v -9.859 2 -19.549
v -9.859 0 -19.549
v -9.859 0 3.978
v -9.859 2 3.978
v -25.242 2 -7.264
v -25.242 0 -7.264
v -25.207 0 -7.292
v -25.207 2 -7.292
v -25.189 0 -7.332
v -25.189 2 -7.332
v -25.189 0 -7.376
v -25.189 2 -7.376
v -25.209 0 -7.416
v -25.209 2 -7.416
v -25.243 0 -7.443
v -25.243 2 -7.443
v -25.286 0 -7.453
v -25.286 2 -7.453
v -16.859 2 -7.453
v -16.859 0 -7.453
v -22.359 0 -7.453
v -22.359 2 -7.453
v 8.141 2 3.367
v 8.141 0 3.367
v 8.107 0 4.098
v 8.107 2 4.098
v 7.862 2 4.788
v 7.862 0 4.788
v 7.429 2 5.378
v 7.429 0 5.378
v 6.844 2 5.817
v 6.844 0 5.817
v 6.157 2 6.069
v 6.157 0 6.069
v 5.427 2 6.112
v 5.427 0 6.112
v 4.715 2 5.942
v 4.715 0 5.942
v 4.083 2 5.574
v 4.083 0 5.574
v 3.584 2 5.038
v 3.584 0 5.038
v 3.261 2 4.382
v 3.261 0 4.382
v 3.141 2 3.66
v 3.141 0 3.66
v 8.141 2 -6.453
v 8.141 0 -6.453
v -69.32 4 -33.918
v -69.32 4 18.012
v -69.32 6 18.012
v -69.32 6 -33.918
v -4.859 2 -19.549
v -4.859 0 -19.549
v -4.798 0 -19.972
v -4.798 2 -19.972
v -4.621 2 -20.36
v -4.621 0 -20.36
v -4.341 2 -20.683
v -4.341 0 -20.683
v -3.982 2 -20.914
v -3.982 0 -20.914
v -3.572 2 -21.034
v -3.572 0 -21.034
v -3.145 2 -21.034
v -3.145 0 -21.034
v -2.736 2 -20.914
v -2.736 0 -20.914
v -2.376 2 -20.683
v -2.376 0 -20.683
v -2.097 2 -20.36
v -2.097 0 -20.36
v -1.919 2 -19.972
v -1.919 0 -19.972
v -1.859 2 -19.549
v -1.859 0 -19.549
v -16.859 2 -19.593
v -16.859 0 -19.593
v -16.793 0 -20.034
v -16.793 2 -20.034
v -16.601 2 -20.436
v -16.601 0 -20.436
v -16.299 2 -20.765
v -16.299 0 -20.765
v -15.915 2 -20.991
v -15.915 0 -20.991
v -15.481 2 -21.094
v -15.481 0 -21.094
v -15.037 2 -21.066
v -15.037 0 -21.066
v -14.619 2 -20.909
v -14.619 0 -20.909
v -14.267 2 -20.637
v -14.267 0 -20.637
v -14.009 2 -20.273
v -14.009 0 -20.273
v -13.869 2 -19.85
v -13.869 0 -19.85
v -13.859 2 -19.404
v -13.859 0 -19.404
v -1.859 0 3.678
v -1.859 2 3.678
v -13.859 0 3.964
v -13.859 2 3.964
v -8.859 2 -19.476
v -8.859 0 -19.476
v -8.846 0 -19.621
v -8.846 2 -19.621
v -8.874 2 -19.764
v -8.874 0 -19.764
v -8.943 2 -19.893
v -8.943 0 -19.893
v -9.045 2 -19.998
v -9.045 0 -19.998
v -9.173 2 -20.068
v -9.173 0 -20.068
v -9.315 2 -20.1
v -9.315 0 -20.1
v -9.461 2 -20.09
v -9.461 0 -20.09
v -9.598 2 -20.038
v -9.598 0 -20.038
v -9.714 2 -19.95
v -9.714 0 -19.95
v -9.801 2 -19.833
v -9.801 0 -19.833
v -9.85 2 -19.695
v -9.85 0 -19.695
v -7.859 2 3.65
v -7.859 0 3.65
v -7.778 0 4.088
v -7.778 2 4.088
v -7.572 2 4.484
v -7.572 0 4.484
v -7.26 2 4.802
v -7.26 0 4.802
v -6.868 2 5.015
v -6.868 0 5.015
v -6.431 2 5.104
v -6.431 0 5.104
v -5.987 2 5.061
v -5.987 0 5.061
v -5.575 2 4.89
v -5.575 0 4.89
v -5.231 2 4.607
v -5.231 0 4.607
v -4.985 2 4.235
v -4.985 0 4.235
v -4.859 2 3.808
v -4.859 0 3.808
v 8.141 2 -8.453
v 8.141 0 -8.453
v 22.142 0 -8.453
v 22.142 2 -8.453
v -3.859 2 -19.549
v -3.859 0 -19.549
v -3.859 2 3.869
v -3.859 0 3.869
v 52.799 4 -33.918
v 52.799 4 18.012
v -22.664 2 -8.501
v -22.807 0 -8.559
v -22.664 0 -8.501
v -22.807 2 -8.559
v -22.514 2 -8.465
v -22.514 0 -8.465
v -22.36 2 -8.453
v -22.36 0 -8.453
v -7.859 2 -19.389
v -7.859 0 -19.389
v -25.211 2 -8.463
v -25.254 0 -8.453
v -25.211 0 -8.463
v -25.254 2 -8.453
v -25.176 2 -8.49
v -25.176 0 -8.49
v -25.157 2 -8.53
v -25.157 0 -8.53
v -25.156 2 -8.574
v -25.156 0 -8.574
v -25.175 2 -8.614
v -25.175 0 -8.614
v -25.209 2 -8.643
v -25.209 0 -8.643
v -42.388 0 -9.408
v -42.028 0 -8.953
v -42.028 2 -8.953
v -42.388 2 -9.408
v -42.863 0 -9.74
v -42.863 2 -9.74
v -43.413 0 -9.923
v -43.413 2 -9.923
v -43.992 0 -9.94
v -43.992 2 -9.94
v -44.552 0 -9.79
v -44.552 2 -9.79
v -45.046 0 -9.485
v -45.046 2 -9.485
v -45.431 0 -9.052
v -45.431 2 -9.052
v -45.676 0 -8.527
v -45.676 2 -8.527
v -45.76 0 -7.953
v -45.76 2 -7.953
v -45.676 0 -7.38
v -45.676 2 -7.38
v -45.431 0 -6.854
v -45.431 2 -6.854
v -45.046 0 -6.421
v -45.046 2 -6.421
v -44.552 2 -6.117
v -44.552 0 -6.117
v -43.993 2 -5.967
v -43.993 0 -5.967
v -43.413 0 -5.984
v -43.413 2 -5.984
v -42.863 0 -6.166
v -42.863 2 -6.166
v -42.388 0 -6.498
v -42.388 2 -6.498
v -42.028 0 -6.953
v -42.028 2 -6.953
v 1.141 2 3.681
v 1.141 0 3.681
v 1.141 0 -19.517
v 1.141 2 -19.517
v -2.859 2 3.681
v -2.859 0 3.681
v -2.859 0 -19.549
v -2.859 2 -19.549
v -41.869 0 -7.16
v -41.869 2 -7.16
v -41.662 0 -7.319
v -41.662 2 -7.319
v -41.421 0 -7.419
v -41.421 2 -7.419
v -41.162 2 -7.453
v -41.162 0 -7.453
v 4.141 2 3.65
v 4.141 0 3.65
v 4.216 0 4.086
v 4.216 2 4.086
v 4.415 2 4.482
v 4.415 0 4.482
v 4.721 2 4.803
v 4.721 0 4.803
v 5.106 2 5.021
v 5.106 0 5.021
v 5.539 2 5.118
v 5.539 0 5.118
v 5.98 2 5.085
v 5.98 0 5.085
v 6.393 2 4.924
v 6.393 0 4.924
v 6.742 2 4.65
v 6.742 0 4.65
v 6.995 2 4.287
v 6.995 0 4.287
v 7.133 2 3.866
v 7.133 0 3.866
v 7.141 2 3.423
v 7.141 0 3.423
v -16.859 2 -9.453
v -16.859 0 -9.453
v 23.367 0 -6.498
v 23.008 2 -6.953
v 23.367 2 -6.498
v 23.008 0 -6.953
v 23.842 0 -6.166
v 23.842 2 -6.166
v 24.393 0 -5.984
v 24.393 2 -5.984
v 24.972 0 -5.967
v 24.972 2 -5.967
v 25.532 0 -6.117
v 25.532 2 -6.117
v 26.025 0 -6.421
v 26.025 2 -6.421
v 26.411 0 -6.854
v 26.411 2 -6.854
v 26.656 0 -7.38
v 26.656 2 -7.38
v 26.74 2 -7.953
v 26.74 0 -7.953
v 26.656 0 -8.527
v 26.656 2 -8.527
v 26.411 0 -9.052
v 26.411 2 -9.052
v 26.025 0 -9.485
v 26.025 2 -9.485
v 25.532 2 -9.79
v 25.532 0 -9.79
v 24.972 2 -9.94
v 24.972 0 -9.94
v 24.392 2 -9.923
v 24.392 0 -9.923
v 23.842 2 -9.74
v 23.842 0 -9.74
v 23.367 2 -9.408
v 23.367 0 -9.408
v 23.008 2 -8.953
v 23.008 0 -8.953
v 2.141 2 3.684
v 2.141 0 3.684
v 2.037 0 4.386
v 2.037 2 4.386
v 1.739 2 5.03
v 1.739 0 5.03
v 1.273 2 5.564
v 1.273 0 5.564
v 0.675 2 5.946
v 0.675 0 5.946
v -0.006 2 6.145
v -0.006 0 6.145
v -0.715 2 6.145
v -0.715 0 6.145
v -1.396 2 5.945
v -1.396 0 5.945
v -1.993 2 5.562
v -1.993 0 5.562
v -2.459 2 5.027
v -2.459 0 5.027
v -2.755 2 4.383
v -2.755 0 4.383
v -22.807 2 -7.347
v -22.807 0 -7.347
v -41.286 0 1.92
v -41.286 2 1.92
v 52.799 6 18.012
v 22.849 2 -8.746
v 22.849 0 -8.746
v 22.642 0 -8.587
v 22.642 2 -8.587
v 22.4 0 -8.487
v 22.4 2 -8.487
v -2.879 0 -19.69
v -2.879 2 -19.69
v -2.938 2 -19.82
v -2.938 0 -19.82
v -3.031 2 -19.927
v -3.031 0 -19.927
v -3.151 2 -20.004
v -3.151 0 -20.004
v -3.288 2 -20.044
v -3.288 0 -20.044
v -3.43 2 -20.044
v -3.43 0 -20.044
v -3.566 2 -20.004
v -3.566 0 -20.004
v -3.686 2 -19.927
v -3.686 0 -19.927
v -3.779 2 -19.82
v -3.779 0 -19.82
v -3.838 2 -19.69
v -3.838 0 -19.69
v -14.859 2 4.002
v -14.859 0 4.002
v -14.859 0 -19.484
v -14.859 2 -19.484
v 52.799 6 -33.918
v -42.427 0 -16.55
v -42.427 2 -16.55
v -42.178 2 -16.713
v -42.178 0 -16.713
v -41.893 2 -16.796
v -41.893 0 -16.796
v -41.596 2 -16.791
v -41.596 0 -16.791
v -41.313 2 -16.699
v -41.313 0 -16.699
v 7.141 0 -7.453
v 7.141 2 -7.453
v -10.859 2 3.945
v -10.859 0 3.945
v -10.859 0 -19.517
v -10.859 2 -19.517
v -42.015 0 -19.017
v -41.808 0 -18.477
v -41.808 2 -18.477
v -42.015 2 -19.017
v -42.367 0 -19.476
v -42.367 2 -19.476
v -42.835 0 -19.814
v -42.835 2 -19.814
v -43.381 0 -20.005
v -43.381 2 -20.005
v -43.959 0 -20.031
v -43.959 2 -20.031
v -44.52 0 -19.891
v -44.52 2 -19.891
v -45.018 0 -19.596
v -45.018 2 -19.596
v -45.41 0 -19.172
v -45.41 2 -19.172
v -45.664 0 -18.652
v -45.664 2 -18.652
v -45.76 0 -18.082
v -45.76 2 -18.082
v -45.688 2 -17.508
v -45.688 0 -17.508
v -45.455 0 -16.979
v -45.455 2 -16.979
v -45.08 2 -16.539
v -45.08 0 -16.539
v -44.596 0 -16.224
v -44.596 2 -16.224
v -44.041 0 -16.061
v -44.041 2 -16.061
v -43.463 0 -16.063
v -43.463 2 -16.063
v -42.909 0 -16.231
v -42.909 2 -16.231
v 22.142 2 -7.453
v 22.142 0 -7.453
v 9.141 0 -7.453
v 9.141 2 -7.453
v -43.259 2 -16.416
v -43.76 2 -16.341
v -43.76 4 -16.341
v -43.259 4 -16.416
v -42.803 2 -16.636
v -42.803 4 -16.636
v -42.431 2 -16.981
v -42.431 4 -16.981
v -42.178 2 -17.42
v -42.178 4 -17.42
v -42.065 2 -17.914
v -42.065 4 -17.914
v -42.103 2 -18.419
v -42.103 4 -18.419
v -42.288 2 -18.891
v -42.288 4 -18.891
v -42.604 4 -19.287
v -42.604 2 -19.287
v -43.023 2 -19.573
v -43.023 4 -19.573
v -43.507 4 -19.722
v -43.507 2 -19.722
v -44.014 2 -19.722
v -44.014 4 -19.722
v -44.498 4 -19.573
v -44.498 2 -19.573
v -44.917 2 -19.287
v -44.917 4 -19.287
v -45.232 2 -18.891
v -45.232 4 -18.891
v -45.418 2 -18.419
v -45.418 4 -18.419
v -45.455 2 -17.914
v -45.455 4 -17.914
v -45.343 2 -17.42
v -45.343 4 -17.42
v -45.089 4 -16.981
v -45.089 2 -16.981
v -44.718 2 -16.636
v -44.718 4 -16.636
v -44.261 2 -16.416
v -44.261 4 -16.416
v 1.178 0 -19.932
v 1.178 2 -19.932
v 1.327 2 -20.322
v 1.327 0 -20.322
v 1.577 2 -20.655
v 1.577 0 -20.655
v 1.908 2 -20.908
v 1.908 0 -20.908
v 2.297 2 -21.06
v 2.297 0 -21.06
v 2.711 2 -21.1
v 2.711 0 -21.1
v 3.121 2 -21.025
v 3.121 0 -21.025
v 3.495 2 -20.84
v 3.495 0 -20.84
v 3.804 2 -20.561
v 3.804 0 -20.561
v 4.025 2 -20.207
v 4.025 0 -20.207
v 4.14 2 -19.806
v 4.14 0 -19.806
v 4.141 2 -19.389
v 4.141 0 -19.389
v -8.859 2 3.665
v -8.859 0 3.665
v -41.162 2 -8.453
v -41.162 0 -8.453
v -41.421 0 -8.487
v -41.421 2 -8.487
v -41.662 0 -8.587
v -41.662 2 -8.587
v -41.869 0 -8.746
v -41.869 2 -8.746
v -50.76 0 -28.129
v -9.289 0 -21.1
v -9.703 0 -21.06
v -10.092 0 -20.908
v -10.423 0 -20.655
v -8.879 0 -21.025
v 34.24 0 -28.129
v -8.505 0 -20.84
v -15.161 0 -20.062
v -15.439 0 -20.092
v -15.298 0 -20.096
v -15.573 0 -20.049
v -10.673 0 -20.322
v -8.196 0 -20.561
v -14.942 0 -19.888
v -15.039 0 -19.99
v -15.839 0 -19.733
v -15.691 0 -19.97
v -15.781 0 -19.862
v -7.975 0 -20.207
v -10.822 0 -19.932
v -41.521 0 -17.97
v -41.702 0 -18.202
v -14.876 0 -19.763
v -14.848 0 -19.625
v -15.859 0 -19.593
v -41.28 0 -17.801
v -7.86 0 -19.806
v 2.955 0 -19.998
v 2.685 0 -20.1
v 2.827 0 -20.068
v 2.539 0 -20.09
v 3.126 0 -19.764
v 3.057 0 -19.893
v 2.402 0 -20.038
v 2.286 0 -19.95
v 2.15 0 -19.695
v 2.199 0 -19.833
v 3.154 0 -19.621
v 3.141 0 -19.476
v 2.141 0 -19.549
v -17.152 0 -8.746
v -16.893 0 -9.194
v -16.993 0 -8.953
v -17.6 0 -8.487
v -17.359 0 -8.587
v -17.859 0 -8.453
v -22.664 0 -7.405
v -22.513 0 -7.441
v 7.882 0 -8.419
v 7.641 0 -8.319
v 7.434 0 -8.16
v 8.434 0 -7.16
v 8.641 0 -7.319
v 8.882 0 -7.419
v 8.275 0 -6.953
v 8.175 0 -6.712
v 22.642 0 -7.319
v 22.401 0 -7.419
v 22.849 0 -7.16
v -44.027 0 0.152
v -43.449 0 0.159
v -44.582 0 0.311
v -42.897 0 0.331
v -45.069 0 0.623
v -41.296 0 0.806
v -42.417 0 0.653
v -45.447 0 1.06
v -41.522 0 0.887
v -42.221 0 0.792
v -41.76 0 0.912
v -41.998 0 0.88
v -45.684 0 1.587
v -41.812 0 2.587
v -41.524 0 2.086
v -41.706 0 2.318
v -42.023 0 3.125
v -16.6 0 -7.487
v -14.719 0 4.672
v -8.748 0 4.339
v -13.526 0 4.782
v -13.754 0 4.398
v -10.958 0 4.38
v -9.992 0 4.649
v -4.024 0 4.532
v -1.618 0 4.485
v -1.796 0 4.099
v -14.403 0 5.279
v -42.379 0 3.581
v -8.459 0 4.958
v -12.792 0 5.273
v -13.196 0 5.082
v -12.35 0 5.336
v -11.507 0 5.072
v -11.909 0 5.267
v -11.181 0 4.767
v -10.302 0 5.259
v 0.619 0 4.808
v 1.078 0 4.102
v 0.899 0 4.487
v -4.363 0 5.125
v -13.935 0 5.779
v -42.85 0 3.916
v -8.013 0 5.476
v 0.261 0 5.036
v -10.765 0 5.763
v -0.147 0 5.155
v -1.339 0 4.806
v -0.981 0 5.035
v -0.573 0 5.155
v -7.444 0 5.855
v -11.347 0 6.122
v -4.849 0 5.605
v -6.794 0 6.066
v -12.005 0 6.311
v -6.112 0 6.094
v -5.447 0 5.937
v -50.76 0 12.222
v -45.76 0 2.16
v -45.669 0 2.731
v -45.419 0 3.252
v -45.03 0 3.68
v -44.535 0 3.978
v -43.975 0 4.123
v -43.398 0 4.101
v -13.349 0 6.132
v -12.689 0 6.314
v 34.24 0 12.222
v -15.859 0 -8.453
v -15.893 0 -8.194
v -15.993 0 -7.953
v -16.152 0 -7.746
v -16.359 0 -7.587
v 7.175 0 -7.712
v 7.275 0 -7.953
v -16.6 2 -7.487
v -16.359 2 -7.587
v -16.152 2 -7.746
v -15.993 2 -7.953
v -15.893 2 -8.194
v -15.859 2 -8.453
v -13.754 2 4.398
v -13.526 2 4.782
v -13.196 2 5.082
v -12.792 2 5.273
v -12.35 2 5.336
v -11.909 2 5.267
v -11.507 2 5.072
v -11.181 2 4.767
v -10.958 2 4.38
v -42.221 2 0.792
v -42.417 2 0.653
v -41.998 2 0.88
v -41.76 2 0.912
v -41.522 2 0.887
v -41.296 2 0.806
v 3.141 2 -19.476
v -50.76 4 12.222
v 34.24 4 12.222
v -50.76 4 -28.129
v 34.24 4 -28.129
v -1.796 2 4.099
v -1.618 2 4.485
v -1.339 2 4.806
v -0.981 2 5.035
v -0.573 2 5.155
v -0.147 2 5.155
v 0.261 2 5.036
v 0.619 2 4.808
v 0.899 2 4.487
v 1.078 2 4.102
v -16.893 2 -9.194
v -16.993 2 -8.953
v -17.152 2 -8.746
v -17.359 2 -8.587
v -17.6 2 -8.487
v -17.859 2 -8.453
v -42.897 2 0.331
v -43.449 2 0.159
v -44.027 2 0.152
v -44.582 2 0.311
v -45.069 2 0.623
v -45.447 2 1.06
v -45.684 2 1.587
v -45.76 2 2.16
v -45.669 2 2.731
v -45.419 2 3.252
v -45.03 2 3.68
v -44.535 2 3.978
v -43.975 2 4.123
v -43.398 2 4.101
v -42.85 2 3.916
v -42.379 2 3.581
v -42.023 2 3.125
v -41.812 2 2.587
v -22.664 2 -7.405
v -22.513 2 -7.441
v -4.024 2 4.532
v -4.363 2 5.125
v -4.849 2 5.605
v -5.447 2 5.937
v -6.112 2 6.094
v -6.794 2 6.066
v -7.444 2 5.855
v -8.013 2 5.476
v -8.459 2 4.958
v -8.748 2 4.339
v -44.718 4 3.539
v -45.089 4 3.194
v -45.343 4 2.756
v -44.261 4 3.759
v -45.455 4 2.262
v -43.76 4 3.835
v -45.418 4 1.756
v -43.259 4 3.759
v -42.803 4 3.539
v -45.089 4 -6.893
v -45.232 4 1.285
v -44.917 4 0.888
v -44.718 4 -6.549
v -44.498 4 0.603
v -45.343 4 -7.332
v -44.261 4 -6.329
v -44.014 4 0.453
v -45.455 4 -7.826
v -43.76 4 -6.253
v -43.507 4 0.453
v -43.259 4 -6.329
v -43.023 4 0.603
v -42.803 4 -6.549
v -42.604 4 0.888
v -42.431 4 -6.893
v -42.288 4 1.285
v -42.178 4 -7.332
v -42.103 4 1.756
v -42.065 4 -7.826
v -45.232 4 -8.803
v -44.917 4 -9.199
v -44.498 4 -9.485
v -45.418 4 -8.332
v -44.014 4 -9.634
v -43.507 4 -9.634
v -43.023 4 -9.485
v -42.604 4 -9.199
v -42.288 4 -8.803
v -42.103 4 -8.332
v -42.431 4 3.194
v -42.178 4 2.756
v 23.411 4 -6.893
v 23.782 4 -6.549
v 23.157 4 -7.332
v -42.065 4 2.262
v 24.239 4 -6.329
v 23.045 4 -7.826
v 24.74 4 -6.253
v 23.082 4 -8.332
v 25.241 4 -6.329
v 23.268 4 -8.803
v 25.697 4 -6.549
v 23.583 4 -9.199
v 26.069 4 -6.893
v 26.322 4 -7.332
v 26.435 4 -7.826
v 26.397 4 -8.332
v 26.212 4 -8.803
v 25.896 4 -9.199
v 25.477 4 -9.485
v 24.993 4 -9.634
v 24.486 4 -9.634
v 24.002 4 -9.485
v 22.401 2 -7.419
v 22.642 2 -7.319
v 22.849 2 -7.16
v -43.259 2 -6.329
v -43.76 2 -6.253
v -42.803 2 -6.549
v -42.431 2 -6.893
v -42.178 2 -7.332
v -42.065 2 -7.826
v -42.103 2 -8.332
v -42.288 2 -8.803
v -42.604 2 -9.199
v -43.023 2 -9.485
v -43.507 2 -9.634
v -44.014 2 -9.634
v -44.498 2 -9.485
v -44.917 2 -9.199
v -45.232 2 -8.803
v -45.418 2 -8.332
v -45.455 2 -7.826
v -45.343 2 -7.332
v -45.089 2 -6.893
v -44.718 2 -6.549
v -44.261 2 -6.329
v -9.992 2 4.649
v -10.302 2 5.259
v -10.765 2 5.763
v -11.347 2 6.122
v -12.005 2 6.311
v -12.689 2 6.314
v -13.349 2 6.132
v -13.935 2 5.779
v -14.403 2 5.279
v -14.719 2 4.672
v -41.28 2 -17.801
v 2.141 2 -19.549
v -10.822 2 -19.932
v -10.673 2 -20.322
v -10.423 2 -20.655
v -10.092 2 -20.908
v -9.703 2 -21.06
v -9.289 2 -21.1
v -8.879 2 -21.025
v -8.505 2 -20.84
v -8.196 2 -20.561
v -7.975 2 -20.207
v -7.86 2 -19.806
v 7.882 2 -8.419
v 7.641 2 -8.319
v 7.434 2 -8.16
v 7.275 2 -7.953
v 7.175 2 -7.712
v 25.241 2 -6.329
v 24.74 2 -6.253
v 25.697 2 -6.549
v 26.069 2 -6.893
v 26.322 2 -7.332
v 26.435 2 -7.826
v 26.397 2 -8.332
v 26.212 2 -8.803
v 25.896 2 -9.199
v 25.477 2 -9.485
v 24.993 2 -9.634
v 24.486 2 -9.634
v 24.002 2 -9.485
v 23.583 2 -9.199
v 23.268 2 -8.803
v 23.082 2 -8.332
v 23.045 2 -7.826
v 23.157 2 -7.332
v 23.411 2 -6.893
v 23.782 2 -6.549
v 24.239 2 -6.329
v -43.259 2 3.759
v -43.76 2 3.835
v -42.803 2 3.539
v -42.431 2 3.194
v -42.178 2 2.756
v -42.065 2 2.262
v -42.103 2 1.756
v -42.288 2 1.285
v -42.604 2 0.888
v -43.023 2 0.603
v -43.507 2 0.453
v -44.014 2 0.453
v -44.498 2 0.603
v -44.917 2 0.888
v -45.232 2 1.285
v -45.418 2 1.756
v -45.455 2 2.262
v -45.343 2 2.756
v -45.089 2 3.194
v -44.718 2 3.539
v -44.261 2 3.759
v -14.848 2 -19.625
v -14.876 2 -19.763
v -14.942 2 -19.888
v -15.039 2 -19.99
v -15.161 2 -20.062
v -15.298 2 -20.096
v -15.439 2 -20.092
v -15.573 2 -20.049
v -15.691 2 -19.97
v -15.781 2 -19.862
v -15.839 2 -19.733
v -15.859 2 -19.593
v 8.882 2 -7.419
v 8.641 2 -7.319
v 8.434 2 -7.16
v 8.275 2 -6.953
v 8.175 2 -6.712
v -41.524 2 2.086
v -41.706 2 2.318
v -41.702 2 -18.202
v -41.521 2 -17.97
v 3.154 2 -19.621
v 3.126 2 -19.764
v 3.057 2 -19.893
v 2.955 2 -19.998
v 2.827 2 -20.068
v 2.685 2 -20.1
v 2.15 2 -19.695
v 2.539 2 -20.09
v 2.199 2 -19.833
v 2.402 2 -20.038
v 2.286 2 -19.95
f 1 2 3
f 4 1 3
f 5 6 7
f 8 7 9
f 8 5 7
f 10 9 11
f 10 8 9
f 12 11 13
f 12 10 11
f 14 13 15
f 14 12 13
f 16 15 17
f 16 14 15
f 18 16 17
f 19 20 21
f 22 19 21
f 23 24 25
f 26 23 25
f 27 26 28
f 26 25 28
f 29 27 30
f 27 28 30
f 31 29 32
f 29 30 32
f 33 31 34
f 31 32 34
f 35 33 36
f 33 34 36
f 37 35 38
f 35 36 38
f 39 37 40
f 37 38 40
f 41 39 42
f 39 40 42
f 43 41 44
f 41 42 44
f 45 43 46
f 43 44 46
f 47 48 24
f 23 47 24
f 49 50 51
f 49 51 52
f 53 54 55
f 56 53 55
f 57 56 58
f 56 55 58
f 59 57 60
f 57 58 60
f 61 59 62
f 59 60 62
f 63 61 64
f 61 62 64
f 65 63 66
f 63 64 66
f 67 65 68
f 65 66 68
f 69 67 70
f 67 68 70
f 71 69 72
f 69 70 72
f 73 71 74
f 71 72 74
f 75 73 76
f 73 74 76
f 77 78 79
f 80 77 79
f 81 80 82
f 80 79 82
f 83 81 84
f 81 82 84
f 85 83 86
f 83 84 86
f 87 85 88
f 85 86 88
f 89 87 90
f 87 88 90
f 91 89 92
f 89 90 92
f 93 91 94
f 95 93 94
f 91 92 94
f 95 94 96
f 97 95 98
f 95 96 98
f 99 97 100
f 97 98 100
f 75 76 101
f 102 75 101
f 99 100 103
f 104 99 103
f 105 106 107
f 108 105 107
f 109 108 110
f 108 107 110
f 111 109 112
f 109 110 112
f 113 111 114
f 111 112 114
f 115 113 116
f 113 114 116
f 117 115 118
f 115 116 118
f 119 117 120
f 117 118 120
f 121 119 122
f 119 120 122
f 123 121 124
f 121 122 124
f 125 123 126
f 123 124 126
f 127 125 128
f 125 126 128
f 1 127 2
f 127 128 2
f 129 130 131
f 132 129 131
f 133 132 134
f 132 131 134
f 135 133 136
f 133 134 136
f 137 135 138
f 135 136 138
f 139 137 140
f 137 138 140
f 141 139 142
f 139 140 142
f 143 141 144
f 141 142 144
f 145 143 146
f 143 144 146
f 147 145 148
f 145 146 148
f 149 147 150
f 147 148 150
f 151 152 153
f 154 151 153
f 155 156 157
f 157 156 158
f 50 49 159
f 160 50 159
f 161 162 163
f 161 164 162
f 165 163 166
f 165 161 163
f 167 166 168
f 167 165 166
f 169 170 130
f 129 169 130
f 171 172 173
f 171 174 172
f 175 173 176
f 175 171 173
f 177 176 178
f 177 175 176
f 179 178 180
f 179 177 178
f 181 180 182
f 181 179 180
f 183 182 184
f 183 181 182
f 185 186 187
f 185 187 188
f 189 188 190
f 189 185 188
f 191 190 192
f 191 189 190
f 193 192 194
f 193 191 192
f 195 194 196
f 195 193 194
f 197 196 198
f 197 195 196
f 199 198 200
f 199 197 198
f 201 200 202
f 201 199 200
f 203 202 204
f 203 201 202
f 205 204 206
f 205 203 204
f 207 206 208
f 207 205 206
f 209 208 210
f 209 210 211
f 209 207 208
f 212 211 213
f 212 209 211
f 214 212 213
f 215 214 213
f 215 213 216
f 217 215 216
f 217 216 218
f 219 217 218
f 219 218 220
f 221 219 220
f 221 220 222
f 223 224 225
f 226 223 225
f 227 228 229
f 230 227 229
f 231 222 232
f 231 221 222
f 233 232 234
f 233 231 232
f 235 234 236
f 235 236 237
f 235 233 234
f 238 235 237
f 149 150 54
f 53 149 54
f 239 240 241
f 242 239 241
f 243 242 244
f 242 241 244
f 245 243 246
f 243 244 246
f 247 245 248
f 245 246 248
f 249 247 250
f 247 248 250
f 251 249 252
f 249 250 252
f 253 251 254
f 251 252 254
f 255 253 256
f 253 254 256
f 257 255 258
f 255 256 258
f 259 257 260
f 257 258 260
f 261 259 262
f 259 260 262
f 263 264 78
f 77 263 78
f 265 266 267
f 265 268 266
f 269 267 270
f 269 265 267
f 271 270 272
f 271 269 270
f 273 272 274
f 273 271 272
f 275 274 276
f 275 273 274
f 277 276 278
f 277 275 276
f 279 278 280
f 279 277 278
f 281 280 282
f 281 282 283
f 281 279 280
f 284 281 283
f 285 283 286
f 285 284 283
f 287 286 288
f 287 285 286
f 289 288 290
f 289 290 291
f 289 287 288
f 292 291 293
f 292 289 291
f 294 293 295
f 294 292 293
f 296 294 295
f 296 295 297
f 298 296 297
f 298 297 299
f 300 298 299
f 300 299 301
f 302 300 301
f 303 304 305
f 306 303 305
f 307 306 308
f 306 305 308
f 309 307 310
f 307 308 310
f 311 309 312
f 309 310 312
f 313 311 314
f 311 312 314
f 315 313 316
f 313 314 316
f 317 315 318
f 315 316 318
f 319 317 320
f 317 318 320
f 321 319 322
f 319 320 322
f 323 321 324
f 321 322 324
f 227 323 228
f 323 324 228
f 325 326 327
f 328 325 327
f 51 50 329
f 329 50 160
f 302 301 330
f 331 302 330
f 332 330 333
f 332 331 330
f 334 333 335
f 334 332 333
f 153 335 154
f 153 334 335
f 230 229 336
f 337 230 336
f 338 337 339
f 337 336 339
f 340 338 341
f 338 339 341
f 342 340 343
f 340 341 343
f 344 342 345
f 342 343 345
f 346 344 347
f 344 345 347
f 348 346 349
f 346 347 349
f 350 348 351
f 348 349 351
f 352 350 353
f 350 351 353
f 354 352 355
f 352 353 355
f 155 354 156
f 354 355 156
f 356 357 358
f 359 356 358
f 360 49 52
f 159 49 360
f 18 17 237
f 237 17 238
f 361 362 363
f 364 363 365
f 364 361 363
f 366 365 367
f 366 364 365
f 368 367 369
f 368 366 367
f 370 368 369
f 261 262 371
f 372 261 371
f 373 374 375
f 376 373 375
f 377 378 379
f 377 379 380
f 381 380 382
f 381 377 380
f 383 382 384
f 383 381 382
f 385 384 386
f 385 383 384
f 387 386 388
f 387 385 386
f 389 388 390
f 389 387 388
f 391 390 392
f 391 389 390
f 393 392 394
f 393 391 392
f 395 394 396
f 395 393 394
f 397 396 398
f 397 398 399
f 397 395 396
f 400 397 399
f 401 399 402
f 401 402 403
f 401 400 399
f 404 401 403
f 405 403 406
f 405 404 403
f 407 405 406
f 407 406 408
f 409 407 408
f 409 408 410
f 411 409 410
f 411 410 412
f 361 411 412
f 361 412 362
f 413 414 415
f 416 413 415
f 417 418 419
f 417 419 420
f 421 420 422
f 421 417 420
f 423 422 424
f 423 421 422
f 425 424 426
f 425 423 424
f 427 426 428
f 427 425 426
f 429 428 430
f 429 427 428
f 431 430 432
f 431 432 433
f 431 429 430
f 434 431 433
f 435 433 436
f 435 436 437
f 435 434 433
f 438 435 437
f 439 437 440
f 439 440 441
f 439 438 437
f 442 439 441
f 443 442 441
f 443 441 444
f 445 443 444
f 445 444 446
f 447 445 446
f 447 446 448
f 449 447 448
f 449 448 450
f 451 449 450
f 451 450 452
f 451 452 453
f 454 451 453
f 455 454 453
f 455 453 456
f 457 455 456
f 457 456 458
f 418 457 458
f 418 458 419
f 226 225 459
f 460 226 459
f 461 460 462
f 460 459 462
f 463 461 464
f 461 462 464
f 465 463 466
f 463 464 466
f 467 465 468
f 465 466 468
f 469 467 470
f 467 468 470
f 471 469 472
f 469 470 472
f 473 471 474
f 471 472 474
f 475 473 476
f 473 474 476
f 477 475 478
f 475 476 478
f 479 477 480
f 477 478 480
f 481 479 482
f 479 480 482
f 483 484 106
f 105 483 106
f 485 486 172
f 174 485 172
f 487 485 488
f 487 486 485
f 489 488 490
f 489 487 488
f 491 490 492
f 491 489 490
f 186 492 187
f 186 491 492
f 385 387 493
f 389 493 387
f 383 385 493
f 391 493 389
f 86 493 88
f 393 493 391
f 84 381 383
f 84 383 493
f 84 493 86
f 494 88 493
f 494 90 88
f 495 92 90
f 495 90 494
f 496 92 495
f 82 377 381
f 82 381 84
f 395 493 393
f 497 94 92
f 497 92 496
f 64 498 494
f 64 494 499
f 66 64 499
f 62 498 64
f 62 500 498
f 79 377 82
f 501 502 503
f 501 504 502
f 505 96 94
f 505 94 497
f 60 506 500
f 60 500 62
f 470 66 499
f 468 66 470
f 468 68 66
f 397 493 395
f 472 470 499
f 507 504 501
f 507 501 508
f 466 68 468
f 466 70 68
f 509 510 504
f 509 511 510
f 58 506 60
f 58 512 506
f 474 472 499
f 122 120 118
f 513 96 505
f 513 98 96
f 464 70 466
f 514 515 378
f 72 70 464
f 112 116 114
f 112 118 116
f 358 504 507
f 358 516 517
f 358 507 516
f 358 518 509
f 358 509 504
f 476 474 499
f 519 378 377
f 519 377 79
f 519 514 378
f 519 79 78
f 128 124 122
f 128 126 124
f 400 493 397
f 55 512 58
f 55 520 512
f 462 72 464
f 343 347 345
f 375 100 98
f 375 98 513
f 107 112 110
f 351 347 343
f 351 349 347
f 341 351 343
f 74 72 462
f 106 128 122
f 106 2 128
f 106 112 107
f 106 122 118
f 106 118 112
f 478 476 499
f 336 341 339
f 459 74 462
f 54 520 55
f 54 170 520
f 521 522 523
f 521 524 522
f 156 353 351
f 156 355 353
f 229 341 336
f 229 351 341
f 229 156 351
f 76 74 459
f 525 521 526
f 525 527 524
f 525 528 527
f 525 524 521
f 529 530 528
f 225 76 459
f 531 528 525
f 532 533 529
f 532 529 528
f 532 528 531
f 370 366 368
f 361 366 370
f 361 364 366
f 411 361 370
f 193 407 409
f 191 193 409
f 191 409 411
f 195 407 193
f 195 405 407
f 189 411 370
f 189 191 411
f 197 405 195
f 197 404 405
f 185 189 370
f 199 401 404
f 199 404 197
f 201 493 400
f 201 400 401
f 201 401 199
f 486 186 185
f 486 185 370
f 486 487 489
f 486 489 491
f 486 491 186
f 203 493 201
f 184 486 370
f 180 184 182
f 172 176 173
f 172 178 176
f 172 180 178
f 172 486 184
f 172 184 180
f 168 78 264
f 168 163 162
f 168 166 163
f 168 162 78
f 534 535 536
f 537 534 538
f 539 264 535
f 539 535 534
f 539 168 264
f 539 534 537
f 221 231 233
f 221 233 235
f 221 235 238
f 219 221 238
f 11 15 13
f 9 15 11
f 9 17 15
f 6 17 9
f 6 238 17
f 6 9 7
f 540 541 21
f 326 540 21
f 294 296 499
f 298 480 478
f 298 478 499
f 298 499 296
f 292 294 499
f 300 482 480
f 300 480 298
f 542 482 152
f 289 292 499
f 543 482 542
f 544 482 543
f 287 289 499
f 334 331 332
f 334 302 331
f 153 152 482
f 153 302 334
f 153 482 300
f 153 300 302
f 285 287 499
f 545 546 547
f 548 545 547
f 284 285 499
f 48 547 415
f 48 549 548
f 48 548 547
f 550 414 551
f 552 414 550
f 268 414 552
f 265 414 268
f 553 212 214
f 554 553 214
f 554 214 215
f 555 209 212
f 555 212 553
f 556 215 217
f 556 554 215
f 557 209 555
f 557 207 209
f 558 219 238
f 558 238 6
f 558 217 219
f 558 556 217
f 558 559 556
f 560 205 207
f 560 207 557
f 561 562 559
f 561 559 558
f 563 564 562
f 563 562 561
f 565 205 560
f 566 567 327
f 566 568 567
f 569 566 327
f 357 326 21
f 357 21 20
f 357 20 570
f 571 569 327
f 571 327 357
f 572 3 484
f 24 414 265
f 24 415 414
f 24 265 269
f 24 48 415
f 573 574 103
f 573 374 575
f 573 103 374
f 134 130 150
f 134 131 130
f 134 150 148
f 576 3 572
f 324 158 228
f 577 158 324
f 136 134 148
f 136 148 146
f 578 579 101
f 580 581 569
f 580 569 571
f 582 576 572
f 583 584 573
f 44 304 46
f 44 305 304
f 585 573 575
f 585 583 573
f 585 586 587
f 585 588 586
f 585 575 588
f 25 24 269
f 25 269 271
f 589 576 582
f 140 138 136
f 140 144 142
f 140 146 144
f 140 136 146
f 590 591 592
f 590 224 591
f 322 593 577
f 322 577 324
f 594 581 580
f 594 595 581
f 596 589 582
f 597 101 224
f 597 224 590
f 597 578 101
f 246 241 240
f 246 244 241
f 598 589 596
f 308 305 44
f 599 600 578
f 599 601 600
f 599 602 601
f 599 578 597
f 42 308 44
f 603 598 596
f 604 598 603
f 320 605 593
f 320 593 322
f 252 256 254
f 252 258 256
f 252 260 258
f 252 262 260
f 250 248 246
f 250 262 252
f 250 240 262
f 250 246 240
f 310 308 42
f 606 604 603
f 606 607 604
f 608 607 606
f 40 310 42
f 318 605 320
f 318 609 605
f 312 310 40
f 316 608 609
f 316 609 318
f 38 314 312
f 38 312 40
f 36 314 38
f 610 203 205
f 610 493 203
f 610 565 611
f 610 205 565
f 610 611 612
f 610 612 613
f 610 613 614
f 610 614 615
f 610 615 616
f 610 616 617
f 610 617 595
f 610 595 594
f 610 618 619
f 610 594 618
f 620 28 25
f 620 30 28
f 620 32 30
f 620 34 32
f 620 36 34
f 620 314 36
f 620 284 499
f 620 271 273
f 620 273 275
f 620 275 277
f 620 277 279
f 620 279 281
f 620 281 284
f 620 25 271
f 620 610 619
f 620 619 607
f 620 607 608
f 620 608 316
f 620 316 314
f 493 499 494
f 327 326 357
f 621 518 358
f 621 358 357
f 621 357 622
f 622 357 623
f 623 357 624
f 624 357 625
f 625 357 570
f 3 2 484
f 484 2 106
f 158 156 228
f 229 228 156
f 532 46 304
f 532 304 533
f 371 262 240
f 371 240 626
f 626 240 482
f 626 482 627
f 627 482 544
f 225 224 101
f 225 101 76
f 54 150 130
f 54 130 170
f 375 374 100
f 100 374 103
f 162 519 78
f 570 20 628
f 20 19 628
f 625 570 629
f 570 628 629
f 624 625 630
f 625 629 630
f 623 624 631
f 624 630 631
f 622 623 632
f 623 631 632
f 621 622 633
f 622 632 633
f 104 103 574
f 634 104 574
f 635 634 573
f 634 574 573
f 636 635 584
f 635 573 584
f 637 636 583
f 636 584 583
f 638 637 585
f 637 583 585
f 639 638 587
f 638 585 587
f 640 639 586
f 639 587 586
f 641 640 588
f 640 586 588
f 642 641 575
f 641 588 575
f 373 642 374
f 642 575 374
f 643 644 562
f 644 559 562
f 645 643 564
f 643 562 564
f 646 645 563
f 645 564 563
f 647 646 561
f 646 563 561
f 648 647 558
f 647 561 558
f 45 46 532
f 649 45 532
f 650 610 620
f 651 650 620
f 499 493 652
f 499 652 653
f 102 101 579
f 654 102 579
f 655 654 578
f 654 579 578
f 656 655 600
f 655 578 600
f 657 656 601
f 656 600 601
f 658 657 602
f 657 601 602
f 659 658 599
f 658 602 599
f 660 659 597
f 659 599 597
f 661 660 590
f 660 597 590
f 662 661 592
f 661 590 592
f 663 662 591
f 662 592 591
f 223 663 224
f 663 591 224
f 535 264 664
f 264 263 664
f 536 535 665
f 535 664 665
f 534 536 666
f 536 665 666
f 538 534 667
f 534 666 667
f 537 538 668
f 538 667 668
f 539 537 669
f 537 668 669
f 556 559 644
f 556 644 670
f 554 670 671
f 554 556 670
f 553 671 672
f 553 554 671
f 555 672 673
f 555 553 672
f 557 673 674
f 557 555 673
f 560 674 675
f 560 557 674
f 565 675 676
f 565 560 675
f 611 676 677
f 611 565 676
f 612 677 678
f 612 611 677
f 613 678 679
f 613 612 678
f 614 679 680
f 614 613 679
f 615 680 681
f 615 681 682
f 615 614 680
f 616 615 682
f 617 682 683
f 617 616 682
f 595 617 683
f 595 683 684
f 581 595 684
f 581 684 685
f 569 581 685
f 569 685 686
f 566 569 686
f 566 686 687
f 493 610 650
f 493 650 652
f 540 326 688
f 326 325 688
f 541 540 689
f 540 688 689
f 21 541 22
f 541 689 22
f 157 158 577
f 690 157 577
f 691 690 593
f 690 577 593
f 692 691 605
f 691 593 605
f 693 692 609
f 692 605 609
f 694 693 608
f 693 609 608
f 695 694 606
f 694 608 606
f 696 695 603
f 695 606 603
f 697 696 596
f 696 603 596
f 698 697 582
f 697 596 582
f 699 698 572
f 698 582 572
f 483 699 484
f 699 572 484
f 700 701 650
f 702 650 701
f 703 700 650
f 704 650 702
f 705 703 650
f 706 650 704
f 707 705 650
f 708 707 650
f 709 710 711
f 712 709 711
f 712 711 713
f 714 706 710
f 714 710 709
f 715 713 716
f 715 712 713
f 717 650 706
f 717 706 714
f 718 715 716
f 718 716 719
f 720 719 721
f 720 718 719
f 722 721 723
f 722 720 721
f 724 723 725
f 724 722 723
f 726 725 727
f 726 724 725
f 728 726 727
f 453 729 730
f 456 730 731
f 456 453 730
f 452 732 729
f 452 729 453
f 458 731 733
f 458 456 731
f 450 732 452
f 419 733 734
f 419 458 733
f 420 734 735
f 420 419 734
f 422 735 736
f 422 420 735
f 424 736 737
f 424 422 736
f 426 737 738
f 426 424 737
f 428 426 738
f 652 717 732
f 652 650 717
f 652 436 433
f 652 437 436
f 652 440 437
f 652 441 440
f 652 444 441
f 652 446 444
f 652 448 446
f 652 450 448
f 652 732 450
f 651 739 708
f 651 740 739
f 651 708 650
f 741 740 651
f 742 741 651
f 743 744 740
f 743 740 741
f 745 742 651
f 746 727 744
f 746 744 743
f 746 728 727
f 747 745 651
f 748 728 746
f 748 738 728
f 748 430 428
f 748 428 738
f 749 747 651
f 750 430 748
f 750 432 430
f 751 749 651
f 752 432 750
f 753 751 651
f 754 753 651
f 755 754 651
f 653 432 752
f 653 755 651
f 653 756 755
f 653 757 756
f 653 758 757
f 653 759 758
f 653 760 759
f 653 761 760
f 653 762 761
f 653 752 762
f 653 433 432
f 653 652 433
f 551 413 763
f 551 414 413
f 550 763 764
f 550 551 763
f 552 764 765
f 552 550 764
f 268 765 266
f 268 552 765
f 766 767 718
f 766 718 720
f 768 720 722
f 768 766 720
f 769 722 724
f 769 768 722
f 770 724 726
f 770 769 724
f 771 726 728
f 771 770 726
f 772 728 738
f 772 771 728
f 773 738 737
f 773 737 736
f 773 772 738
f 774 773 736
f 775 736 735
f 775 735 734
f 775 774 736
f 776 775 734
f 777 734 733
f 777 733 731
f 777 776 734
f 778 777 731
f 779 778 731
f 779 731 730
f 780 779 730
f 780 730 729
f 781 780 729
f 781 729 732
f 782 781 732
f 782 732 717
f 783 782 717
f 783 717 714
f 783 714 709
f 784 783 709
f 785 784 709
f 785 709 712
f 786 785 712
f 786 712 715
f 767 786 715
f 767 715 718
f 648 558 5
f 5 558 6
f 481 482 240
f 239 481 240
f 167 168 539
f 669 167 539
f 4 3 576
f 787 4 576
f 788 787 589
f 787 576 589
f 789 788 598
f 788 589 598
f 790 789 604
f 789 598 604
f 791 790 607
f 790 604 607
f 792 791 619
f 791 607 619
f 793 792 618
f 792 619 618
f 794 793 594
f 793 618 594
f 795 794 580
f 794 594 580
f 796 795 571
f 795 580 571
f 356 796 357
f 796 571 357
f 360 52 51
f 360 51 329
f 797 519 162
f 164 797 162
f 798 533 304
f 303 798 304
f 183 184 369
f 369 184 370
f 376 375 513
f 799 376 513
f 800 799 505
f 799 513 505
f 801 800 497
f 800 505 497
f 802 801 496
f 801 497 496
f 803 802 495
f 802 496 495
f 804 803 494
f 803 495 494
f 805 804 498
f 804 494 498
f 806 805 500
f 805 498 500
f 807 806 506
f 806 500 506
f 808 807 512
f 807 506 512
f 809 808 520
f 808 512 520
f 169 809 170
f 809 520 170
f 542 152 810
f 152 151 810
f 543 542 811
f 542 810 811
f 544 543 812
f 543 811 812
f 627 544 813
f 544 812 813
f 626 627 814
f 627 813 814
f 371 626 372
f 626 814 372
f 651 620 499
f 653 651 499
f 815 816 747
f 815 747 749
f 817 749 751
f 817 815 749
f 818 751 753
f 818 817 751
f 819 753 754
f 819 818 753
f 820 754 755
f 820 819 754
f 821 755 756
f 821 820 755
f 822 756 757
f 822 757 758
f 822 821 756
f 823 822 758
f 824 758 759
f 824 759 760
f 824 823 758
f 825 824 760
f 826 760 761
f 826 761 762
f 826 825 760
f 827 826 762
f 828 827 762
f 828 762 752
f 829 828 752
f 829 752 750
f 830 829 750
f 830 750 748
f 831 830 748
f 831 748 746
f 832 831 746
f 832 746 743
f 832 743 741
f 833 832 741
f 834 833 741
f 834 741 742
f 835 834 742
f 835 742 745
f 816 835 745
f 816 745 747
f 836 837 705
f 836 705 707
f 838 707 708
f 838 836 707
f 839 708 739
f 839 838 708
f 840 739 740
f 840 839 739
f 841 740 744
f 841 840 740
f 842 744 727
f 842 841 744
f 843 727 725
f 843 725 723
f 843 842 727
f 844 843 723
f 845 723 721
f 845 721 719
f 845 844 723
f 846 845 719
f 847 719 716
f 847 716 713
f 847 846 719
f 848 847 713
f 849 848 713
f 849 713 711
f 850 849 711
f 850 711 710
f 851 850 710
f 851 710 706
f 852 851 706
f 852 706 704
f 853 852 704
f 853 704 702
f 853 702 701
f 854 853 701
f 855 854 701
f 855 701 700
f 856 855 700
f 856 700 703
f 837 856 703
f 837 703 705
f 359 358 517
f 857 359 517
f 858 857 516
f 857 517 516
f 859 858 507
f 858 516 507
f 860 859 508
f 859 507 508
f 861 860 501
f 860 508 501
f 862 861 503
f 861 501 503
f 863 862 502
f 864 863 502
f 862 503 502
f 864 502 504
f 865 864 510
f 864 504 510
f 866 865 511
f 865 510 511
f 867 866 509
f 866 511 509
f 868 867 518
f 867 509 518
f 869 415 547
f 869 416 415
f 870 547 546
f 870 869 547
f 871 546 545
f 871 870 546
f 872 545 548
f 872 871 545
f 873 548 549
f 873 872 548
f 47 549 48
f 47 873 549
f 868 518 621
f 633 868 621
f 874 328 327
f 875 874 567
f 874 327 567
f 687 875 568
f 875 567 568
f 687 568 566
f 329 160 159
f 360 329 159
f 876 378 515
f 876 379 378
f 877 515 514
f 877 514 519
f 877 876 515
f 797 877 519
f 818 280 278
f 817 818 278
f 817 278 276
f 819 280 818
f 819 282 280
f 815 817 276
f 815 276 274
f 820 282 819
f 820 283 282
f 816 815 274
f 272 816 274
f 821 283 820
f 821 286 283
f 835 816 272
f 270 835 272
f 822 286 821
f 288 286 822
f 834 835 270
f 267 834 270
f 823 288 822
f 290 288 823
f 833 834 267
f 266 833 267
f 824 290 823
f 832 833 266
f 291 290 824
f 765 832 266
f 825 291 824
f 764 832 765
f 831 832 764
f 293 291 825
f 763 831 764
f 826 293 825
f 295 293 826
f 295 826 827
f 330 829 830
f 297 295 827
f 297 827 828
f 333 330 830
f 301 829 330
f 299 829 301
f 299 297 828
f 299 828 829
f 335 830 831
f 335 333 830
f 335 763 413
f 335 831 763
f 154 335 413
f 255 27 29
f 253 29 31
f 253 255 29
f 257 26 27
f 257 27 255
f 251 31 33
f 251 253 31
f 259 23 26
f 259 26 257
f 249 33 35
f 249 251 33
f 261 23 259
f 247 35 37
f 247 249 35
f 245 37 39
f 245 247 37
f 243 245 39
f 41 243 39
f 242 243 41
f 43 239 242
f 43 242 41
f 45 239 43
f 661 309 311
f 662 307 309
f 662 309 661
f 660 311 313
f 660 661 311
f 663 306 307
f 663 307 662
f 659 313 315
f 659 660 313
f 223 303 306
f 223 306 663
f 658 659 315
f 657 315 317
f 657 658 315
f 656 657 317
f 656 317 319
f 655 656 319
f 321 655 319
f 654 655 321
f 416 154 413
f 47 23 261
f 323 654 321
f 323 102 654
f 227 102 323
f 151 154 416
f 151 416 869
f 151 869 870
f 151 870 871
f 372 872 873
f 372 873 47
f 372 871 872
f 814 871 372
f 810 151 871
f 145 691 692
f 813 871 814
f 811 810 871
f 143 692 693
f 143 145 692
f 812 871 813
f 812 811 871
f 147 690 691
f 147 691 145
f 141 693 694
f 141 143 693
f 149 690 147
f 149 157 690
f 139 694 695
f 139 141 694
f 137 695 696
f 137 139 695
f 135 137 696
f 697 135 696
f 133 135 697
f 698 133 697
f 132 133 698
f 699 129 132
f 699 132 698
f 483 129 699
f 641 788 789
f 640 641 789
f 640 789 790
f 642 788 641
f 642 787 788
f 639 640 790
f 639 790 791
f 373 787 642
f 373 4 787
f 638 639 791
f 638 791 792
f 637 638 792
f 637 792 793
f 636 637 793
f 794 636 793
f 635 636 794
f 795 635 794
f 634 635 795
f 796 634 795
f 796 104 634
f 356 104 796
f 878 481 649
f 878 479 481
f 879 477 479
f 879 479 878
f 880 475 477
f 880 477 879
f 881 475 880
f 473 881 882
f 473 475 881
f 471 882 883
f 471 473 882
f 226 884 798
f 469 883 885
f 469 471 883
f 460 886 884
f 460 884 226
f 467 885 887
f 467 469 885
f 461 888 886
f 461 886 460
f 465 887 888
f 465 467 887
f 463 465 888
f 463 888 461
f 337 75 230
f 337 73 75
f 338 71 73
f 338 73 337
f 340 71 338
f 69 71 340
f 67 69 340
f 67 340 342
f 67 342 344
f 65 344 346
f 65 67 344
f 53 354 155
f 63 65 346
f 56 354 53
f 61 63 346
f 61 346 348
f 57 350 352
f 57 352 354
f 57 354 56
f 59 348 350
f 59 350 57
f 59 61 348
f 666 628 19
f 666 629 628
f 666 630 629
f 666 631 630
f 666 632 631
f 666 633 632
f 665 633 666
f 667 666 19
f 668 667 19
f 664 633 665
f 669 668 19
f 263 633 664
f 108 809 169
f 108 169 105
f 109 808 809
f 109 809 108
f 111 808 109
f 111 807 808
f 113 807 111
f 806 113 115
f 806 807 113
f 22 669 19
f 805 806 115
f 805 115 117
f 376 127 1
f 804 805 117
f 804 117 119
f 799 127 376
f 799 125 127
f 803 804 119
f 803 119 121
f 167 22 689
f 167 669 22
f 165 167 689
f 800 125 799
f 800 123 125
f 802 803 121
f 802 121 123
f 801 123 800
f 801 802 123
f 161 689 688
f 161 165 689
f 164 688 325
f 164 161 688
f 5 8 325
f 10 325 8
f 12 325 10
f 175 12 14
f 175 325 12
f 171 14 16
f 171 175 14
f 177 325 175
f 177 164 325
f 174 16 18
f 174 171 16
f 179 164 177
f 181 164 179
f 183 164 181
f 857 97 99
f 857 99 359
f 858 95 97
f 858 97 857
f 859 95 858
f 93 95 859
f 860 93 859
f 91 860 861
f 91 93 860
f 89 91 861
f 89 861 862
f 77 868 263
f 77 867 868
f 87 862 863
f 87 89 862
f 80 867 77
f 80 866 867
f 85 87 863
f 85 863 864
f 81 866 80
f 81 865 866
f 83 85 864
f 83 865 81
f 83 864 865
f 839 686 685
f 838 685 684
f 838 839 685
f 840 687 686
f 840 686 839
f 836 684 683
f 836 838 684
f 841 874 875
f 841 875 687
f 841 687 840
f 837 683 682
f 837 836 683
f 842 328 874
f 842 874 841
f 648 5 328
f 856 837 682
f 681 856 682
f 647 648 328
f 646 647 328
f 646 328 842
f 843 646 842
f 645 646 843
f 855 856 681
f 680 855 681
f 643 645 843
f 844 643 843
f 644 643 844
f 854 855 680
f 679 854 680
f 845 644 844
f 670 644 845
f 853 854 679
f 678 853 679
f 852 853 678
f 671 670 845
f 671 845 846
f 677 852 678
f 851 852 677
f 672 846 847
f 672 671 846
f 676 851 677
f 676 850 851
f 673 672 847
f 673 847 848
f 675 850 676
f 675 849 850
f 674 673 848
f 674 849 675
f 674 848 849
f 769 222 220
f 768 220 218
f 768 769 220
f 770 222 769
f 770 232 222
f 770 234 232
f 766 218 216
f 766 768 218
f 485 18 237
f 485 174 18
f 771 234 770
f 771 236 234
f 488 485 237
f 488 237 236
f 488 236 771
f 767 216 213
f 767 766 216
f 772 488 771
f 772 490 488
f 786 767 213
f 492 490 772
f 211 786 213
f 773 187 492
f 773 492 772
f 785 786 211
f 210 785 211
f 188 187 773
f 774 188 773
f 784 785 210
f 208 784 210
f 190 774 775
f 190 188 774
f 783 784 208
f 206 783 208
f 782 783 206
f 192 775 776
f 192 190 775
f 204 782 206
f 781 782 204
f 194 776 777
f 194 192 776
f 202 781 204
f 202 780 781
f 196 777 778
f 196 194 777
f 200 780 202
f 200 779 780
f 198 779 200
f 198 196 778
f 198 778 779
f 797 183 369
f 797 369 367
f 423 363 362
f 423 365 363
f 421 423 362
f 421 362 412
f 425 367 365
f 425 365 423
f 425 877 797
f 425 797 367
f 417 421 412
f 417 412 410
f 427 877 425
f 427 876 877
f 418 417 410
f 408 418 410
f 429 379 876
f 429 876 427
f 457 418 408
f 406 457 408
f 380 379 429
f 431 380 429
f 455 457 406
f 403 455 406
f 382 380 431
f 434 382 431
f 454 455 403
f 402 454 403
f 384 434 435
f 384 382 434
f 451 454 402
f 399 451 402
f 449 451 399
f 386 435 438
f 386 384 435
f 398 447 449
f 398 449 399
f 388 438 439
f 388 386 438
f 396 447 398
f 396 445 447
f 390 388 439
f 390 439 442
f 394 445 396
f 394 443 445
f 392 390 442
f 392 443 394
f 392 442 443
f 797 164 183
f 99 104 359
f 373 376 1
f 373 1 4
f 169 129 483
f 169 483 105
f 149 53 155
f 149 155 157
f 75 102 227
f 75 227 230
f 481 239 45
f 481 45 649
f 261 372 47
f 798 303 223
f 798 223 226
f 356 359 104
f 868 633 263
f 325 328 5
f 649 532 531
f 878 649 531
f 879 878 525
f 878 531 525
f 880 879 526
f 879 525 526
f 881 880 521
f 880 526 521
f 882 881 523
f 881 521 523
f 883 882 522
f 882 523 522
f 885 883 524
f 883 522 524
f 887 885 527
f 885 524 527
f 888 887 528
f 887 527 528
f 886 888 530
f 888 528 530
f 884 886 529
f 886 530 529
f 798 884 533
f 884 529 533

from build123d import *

# Parameters (mm, degrees)
SKETCH_2_W           = 85
SKETCH_2_H           = 40.350877193
EXTRUDE_2_DEPTH      = 4
CUT_EXTRUDE_9_DEPTH  = 2
SKETCH_4_R           = 2
CUT_EXTRUDE_13_DEPTH = 2
SKETCH_8_R           = 2
CUT_EXTRUDE_14_DEPTH = 2
SKETCH_9_R           = 1.7
CUT_EXTRUDE_15_DEPTH = 4
FILLET_6_R           = 1
FILLET_9_R           = 50
FILLET_11_R          = 1
FILLET_12_R          = 1
FILLET_13_R          = 1
FILLET_14_R          = 1
FILLET_15_R          = 1
FILLET_16_R          = 1
FILLET_17_R          = 1
FILLET_18_R          = 1
FILLET_19_R          = 1
FILLET_23_R          = 0.1
FILLET_24_R          = 0.1
FILLET_25_R          = 1
FILLET_26_R          = 1
FILLET_27_R          = 1
FILLET_28_R          = 1
SKETCH_11_W          = 122.119447846
SKETCH_11_H          = 51.930010933
EXTRUDE_4_DEPTH      = 2


with BuildPart() as part:
    # 草图2 → 凸台-拉伸2 (new body)
    with BuildSketch(Plane(origin=(0, 0, 0), x_dir=(1, 0, 0), z_dir=(0, 1, 0))):
        with Locations((-8.260233918, 7.953216375)):
            Rectangle(SKETCH_2_W, SKETCH_2_H)
    extrude(amount=EXTRUDE_2_DEPTH)

    # 草图3 → 切除-拉伸9 (cut)
    with BuildSketch(Plane(origin=(0, 0, 0), x_dir=(1, 0, 0), z_dir=(0, 1, 0))):
        with BuildLine():
            Line((7.141300063, -3.423174679), (7.141300063, 7.953075954))
            Line((7.141300063, 7.953075954), (7.141300063, 8.453075954))
            Line((7.141300063, 8.453075954), (22.939766082, 8.453075954))
            Line((22.939766082, 8.453075954), (22.939766082, 7.453075954))
            Line((22.939766082, 7.453075954), (8.332708966, 7.453075954))
            Line((8.332708966, 7.453075954), (8.141300063, 7.453075954))
            Line((8.141300063, 7.453075954), (8.141300063, -3.367226613))
            ThreePointArc((8.141300063, -3.367226613), (5.793603892, -6.117542647), (3.141300063, -3.659657378))
            Line((3.141300063, -3.659657378), (3.141300063, 19.475628159))
            ThreePointArc((3.141300063, 19.475628159), (2.684570377, 20.099991696), (2.141300063, 19.54927471))
            Line((2.141300063, 19.54927471), (2.141300063, -3.684214987))
            ThreePointArc((2.141300063, -3.684214987), (-0.360392065, -6.170265877), (-2.858699937, -3.680814068))
            Line((-2.858699937, -3.680814068), (-2.858699937, 19.54927471))
            ThreePointArc((-2.858699937, 19.54927471), (-3.358699937, 20.04927471), (-3.858699937, 19.54927471))
            Line((-3.858699937, 19.54927471), (-3.858699937, -3.868826578))
            ThreePointArc((-3.858699937, -3.868826578), (-6.45406539, -6.103506829), (-8.858699937, -3.664767327))
            Line((-8.858699937, -3.664767327), (-8.858699937, 19.475628159))
            ThreePointArc((-8.858699937, 19.475628159), (-9.315429623, 20.099991696), (-9.858699937, 19.54927471))
            Line((-9.858699937, 19.54927471), (-9.858699937, -3.977792488))
            ThreePointArc((-9.858699937, -3.977792488), (-12.347177567, -6.336059123), (-14.858699937, -4.002350096))
            Line((-14.858699937, -4.002350096), (-14.858699937, 19.484229611))
            ThreePointArc((-14.858699937, 19.484229611), (-15.297787958, 20.096444716), (-15.858699937, 19.593470188))
            Line((-15.858699937, 19.593470188), (-15.858699937, 8.453075954))
            Line((-15.858699937, 8.453075954), (-15.858699937, 7.453075954))
            Line((-15.858699937, 7.453075954), (-22.595809003, 7.453075954))
            Line((-22.595809003, 7.453075954), (-41.760233918, -2.157381342))
            Line((-41.760233918, -2.157381342), (-42.566026343, -1.44384175))
            Line((-42.566026343, -1.44384175), (-24.864828341, 7.453075954))
            Line((-24.864828341, 7.453075954), (-42.564621955, 7.453075954))
            Line((-42.564621955, 7.453075954), (-42.564621955, 8.453075954))
            Line((-42.564621955, 8.453075954), (-24.830823405, 8.453075954))
            Line((-24.830823405, 8.453075954), (-42.207658328, 17.14661392))
            Line((-42.207658328, 17.14661392), (-41.760233918, 18.040935673))
            Line((-41.760233918, 18.040935673), (-22.595809003, 8.453075954))
            Line((-22.595809003, 8.453075954), (-16.858699937, 8.453075954))
            Line((-16.858699937, 8.453075954), (-16.858699937, 19.593470188))
            ThreePointArc((-16.858699937, 19.593470188), (-15.257940096, 21.096450602), (-13.858699937, 19.404259958))
            Line((-13.858699937, 19.404259958), (-13.858699937, -3.963766104))
            ThreePointArc((-13.858699937, -3.963766104), (-12.349941217, -5.336059103), (-10.858699937, -3.944750225))
            Line((-10.858699937, -3.944750225), (-10.858699937, 19.517270996))
            ThreePointArc((-10.858699937, 19.517270996), (-9.288566003, 21.099997568), (-7.858699937, 19.38949267))
            Line((-7.858699937, 19.38949267), (-7.858699937, -3.649723614))
            ThreePointArc((-7.858699937, -3.649723614), (-6.431116121, -5.10350525), (-4.858699937, -3.807749123))
            Line((-4.858699937, -3.807749123), (-4.858699937, 19.54927471))
            ThreePointArc((-4.858699937, 19.54927471), (-3.358699937, 21.04927471), (-1.858699937, 19.54927471))
            Line((-1.858699937, 19.54927471), (-1.858699937, -3.678429695))
            ThreePointArc((-1.858699937, -3.678429695), (-0.360008779, -5.170265877), (1.141300063, -3.681064031))
            Line((1.141300063, -3.681064031), (1.141300063, 19.517270996))
            ThreePointArc((1.141300063, 19.517270996), (2.711433997, 21.099997568), (4.141300063, 19.38949267))
            Line((4.141300063, 19.38949267), (4.141300063, -3.649723614))
            ThreePointArc((4.141300063, -3.649723614), (5.760698323, -5.117541465), (7.141300063, -3.423174679))
        make_face()
    extrude(amount=CUT_EXTRUDE_9_DEPTH, mode=Mode.SUBTRACT)

    # 草图4 → 切除-拉伸13 (cut)
    with BuildSketch(Plane(origin=(0, 0, 0), x_dir=(1, 0, 0), z_dir=(0, 1, 0))):
        with Locations((-43.760233918, 18.040935673)):
            Circle(SKETCH_4_R)
        with Locations((-43.760233918, 7.953216374)):
            Circle(SKETCH_4_R)
        with Locations((-43.760233918, -2.134502924)):
            Circle(SKETCH_4_R)
    extrude(amount=CUT_EXTRUDE_13_DEPTH, mode=Mode.SUBTRACT)

    # 草图8 → 切除-拉伸14 (cut)
    with BuildSketch(Plane(origin=(0, 0, 0), x_dir=(1, 0, 0), z_dir=(0, 1, 0))):
        with Locations((24.739766082, 7.953216374)):
            Circle(SKETCH_8_R)
    extrude(amount=CUT_EXTRUDE_14_DEPTH, mode=Mode.SUBTRACT)

    # 草图9 → 切除-拉伸15 (cut)
    with BuildSketch(Plane(origin=(0, 0, 0), x_dir=(1, 0, 0), z_dir=(0, 1, 0))):
        with Locations(Location((-43.760233918, 18.040935673, 0), (0, 0, 270))):
            Circle(SKETCH_9_R)
        with Locations(Location((-43.760233918, 7.953216374, 0), (0, 0, 270))):
            Circle(SKETCH_9_R)
        with Locations(Location((-43.760233918, -2.134502924, 0), (0, 0, 270))):
            Circle(SKETCH_9_R)
        with Locations(Location((24.739766082, 7.953216374, 0), (0, 0, 270))):
            Circle(SKETCH_9_R)
    extrude(amount=CUT_EXTRUDE_15_DEPTH, mode=Mode.SUBTRACT)

    # 圆角6
    fillet_6_edges = [part.edges().sort_by_distance(p)[0] for p in [
        (-42.010998928, 1, 1.164875703),
    ]]
    fillet(fillet_6_edges, radius=FILLET_6_R)

    # 圆角9
    # the kernel refuses this fillet: 50 mm, written as the material it adds along each edge
    with BuildSketch(Plane(origin=(-41.760233918, 0, 2.157381342), x_dir=(-0.7486630061639391, 0, -0.6629507547333918), z_dir=(0, 1, 0))) as fillet_9_piece_1:
        with BuildLine():
            CenterArc((46.363497209, -18.720100753), FILLET_9_R, 158.012641456, 0.145228932)
            Line((-0.047128239, -0.117578196), (0, 0))
            Line((0, 0), (0.000173043, 0))
        make_face()
    extrude(amount=2.316679088)

    # 圆角11
    fillet_11_edges = [part.edges().sort_by_distance(p)[0] for p in [
        (-41.760363469, 1, 2.157266623),
    ]]
    fillet(fillet_11_edges, radius=FILLET_11_R)

    # 圆角12
    fillet_12_edges = [part.edges().sort_by_distance(p)[0] for p in [
        (22.80331067, 1, -7.453075954),
    ]]
    fillet(fillet_12_edges, radius=FILLET_12_R)

    # 圆角13
    fillet_13_edges = [part.edges().sort_by_distance(p)[0] for p in [
        (22.803238158, 1, -8.453075954),
    ]]
    fillet(fillet_13_edges, radius=FILLET_13_R)

    # 圆角14
    fillet_14_edges = [part.edges().sort_by_distance(p)[0] for p in [
        (8.141300063, 1, -7.453075954),
    ]]
    fillet(fillet_14_edges, radius=FILLET_14_R)

    # 圆角15
    fillet_15_edges = [part.edges().sort_by_distance(p)[0] for p in [
        (7.141300063, 1, -8.453075954),
    ]]
    fillet(fillet_15_edges, radius=FILLET_15_R)

    # 圆角16
    fillet_16_edges = [part.edges().sort_by_distance(p)[0] for p in [
        (-16.858699937, 1, -8.453075954),
    ]]
    fillet(fillet_16_edges, radius=FILLET_16_R)

    # 圆角17
    fillet_17_edges = [part.edges().sort_by_distance(p)[0] for p in [
        (-15.858699937, 1, -7.453075954),
    ]]
    fillet(fillet_17_edges, radius=FILLET_17_R)

    # 圆角18
    fillet_18_edges = [part.edges().sort_by_distance(p)[0] for p in [
        (-22.595809003, 1, -8.453075954),
    ]]
    fillet(fillet_18_edges, radius=FILLET_18_R)

    # 圆角19
    fillet_19_edges = [part.edges().sort_by_distance(p)[0] for p in [
        (-22.595809003, 1, -7.453075954),
    ]]
    fillet(fillet_19_edges, radius=FILLET_19_R)

    # 圆角23
    fillet_23_edges = [part.edges().sort_by_distance(p)[0] for p in [
        (-24.864828341, 1, -7.453075954),
    ]]
    fillet(fillet_23_edges, radius=FILLET_23_R)

    # 圆角24
    fillet_24_edges = [part.edges().sort_by_distance(p)[0] for p in [
        (-24.830823405, 1, -8.453075954),
    ]]
    fillet(fillet_24_edges, radius=FILLET_24_R)

    # 圆角25
    fillet_25_edges = [part.edges().sort_by_distance(p)[0] for p in [
        (-41.760233918, 1, -18.040935673),
    ]]
    fillet(fillet_25_edges, radius=FILLET_25_R)

    # 圆角26
    fillet_26_edges = [part.edges().sort_by_distance(p)[0] for p in [
        (-42.021111406, 1, -17.053285488),
    ]]
    fillet(fillet_26_edges, radius=FILLET_26_R)

    # 圆角27
    fillet_27_edges = [part.edges().sort_by_distance(p)[0] for p in [
        (-41.823705994, 1, -8.453075954),
    ]]
    fillet(fillet_27_edges, radius=FILLET_27_R)

    # 圆角28
    fillet_28_edges = [part.edges().sort_by_distance(p)[0] for p in [
        (-41.823778507, 1, -7.453075954),
    ]]
    fillet(fillet_28_edges, radius=FILLET_28_R)


with BuildPart() as body_2:
    # 草图11 → 凸台-拉伸4 (new body)
    with BuildSketch(Plane(origin=(0, 4, 0), x_dir=(1, 0, 0), z_dir=(0, 1, 0))):
        with Locations((-8.260233918, 7.953216375)):
            Rectangle(SKETCH_11_W, SKETCH_11_H)
    extrude(amount=EXTRUDE_4_DEPTH)


solid = Compound([part.part, body_2.part])
